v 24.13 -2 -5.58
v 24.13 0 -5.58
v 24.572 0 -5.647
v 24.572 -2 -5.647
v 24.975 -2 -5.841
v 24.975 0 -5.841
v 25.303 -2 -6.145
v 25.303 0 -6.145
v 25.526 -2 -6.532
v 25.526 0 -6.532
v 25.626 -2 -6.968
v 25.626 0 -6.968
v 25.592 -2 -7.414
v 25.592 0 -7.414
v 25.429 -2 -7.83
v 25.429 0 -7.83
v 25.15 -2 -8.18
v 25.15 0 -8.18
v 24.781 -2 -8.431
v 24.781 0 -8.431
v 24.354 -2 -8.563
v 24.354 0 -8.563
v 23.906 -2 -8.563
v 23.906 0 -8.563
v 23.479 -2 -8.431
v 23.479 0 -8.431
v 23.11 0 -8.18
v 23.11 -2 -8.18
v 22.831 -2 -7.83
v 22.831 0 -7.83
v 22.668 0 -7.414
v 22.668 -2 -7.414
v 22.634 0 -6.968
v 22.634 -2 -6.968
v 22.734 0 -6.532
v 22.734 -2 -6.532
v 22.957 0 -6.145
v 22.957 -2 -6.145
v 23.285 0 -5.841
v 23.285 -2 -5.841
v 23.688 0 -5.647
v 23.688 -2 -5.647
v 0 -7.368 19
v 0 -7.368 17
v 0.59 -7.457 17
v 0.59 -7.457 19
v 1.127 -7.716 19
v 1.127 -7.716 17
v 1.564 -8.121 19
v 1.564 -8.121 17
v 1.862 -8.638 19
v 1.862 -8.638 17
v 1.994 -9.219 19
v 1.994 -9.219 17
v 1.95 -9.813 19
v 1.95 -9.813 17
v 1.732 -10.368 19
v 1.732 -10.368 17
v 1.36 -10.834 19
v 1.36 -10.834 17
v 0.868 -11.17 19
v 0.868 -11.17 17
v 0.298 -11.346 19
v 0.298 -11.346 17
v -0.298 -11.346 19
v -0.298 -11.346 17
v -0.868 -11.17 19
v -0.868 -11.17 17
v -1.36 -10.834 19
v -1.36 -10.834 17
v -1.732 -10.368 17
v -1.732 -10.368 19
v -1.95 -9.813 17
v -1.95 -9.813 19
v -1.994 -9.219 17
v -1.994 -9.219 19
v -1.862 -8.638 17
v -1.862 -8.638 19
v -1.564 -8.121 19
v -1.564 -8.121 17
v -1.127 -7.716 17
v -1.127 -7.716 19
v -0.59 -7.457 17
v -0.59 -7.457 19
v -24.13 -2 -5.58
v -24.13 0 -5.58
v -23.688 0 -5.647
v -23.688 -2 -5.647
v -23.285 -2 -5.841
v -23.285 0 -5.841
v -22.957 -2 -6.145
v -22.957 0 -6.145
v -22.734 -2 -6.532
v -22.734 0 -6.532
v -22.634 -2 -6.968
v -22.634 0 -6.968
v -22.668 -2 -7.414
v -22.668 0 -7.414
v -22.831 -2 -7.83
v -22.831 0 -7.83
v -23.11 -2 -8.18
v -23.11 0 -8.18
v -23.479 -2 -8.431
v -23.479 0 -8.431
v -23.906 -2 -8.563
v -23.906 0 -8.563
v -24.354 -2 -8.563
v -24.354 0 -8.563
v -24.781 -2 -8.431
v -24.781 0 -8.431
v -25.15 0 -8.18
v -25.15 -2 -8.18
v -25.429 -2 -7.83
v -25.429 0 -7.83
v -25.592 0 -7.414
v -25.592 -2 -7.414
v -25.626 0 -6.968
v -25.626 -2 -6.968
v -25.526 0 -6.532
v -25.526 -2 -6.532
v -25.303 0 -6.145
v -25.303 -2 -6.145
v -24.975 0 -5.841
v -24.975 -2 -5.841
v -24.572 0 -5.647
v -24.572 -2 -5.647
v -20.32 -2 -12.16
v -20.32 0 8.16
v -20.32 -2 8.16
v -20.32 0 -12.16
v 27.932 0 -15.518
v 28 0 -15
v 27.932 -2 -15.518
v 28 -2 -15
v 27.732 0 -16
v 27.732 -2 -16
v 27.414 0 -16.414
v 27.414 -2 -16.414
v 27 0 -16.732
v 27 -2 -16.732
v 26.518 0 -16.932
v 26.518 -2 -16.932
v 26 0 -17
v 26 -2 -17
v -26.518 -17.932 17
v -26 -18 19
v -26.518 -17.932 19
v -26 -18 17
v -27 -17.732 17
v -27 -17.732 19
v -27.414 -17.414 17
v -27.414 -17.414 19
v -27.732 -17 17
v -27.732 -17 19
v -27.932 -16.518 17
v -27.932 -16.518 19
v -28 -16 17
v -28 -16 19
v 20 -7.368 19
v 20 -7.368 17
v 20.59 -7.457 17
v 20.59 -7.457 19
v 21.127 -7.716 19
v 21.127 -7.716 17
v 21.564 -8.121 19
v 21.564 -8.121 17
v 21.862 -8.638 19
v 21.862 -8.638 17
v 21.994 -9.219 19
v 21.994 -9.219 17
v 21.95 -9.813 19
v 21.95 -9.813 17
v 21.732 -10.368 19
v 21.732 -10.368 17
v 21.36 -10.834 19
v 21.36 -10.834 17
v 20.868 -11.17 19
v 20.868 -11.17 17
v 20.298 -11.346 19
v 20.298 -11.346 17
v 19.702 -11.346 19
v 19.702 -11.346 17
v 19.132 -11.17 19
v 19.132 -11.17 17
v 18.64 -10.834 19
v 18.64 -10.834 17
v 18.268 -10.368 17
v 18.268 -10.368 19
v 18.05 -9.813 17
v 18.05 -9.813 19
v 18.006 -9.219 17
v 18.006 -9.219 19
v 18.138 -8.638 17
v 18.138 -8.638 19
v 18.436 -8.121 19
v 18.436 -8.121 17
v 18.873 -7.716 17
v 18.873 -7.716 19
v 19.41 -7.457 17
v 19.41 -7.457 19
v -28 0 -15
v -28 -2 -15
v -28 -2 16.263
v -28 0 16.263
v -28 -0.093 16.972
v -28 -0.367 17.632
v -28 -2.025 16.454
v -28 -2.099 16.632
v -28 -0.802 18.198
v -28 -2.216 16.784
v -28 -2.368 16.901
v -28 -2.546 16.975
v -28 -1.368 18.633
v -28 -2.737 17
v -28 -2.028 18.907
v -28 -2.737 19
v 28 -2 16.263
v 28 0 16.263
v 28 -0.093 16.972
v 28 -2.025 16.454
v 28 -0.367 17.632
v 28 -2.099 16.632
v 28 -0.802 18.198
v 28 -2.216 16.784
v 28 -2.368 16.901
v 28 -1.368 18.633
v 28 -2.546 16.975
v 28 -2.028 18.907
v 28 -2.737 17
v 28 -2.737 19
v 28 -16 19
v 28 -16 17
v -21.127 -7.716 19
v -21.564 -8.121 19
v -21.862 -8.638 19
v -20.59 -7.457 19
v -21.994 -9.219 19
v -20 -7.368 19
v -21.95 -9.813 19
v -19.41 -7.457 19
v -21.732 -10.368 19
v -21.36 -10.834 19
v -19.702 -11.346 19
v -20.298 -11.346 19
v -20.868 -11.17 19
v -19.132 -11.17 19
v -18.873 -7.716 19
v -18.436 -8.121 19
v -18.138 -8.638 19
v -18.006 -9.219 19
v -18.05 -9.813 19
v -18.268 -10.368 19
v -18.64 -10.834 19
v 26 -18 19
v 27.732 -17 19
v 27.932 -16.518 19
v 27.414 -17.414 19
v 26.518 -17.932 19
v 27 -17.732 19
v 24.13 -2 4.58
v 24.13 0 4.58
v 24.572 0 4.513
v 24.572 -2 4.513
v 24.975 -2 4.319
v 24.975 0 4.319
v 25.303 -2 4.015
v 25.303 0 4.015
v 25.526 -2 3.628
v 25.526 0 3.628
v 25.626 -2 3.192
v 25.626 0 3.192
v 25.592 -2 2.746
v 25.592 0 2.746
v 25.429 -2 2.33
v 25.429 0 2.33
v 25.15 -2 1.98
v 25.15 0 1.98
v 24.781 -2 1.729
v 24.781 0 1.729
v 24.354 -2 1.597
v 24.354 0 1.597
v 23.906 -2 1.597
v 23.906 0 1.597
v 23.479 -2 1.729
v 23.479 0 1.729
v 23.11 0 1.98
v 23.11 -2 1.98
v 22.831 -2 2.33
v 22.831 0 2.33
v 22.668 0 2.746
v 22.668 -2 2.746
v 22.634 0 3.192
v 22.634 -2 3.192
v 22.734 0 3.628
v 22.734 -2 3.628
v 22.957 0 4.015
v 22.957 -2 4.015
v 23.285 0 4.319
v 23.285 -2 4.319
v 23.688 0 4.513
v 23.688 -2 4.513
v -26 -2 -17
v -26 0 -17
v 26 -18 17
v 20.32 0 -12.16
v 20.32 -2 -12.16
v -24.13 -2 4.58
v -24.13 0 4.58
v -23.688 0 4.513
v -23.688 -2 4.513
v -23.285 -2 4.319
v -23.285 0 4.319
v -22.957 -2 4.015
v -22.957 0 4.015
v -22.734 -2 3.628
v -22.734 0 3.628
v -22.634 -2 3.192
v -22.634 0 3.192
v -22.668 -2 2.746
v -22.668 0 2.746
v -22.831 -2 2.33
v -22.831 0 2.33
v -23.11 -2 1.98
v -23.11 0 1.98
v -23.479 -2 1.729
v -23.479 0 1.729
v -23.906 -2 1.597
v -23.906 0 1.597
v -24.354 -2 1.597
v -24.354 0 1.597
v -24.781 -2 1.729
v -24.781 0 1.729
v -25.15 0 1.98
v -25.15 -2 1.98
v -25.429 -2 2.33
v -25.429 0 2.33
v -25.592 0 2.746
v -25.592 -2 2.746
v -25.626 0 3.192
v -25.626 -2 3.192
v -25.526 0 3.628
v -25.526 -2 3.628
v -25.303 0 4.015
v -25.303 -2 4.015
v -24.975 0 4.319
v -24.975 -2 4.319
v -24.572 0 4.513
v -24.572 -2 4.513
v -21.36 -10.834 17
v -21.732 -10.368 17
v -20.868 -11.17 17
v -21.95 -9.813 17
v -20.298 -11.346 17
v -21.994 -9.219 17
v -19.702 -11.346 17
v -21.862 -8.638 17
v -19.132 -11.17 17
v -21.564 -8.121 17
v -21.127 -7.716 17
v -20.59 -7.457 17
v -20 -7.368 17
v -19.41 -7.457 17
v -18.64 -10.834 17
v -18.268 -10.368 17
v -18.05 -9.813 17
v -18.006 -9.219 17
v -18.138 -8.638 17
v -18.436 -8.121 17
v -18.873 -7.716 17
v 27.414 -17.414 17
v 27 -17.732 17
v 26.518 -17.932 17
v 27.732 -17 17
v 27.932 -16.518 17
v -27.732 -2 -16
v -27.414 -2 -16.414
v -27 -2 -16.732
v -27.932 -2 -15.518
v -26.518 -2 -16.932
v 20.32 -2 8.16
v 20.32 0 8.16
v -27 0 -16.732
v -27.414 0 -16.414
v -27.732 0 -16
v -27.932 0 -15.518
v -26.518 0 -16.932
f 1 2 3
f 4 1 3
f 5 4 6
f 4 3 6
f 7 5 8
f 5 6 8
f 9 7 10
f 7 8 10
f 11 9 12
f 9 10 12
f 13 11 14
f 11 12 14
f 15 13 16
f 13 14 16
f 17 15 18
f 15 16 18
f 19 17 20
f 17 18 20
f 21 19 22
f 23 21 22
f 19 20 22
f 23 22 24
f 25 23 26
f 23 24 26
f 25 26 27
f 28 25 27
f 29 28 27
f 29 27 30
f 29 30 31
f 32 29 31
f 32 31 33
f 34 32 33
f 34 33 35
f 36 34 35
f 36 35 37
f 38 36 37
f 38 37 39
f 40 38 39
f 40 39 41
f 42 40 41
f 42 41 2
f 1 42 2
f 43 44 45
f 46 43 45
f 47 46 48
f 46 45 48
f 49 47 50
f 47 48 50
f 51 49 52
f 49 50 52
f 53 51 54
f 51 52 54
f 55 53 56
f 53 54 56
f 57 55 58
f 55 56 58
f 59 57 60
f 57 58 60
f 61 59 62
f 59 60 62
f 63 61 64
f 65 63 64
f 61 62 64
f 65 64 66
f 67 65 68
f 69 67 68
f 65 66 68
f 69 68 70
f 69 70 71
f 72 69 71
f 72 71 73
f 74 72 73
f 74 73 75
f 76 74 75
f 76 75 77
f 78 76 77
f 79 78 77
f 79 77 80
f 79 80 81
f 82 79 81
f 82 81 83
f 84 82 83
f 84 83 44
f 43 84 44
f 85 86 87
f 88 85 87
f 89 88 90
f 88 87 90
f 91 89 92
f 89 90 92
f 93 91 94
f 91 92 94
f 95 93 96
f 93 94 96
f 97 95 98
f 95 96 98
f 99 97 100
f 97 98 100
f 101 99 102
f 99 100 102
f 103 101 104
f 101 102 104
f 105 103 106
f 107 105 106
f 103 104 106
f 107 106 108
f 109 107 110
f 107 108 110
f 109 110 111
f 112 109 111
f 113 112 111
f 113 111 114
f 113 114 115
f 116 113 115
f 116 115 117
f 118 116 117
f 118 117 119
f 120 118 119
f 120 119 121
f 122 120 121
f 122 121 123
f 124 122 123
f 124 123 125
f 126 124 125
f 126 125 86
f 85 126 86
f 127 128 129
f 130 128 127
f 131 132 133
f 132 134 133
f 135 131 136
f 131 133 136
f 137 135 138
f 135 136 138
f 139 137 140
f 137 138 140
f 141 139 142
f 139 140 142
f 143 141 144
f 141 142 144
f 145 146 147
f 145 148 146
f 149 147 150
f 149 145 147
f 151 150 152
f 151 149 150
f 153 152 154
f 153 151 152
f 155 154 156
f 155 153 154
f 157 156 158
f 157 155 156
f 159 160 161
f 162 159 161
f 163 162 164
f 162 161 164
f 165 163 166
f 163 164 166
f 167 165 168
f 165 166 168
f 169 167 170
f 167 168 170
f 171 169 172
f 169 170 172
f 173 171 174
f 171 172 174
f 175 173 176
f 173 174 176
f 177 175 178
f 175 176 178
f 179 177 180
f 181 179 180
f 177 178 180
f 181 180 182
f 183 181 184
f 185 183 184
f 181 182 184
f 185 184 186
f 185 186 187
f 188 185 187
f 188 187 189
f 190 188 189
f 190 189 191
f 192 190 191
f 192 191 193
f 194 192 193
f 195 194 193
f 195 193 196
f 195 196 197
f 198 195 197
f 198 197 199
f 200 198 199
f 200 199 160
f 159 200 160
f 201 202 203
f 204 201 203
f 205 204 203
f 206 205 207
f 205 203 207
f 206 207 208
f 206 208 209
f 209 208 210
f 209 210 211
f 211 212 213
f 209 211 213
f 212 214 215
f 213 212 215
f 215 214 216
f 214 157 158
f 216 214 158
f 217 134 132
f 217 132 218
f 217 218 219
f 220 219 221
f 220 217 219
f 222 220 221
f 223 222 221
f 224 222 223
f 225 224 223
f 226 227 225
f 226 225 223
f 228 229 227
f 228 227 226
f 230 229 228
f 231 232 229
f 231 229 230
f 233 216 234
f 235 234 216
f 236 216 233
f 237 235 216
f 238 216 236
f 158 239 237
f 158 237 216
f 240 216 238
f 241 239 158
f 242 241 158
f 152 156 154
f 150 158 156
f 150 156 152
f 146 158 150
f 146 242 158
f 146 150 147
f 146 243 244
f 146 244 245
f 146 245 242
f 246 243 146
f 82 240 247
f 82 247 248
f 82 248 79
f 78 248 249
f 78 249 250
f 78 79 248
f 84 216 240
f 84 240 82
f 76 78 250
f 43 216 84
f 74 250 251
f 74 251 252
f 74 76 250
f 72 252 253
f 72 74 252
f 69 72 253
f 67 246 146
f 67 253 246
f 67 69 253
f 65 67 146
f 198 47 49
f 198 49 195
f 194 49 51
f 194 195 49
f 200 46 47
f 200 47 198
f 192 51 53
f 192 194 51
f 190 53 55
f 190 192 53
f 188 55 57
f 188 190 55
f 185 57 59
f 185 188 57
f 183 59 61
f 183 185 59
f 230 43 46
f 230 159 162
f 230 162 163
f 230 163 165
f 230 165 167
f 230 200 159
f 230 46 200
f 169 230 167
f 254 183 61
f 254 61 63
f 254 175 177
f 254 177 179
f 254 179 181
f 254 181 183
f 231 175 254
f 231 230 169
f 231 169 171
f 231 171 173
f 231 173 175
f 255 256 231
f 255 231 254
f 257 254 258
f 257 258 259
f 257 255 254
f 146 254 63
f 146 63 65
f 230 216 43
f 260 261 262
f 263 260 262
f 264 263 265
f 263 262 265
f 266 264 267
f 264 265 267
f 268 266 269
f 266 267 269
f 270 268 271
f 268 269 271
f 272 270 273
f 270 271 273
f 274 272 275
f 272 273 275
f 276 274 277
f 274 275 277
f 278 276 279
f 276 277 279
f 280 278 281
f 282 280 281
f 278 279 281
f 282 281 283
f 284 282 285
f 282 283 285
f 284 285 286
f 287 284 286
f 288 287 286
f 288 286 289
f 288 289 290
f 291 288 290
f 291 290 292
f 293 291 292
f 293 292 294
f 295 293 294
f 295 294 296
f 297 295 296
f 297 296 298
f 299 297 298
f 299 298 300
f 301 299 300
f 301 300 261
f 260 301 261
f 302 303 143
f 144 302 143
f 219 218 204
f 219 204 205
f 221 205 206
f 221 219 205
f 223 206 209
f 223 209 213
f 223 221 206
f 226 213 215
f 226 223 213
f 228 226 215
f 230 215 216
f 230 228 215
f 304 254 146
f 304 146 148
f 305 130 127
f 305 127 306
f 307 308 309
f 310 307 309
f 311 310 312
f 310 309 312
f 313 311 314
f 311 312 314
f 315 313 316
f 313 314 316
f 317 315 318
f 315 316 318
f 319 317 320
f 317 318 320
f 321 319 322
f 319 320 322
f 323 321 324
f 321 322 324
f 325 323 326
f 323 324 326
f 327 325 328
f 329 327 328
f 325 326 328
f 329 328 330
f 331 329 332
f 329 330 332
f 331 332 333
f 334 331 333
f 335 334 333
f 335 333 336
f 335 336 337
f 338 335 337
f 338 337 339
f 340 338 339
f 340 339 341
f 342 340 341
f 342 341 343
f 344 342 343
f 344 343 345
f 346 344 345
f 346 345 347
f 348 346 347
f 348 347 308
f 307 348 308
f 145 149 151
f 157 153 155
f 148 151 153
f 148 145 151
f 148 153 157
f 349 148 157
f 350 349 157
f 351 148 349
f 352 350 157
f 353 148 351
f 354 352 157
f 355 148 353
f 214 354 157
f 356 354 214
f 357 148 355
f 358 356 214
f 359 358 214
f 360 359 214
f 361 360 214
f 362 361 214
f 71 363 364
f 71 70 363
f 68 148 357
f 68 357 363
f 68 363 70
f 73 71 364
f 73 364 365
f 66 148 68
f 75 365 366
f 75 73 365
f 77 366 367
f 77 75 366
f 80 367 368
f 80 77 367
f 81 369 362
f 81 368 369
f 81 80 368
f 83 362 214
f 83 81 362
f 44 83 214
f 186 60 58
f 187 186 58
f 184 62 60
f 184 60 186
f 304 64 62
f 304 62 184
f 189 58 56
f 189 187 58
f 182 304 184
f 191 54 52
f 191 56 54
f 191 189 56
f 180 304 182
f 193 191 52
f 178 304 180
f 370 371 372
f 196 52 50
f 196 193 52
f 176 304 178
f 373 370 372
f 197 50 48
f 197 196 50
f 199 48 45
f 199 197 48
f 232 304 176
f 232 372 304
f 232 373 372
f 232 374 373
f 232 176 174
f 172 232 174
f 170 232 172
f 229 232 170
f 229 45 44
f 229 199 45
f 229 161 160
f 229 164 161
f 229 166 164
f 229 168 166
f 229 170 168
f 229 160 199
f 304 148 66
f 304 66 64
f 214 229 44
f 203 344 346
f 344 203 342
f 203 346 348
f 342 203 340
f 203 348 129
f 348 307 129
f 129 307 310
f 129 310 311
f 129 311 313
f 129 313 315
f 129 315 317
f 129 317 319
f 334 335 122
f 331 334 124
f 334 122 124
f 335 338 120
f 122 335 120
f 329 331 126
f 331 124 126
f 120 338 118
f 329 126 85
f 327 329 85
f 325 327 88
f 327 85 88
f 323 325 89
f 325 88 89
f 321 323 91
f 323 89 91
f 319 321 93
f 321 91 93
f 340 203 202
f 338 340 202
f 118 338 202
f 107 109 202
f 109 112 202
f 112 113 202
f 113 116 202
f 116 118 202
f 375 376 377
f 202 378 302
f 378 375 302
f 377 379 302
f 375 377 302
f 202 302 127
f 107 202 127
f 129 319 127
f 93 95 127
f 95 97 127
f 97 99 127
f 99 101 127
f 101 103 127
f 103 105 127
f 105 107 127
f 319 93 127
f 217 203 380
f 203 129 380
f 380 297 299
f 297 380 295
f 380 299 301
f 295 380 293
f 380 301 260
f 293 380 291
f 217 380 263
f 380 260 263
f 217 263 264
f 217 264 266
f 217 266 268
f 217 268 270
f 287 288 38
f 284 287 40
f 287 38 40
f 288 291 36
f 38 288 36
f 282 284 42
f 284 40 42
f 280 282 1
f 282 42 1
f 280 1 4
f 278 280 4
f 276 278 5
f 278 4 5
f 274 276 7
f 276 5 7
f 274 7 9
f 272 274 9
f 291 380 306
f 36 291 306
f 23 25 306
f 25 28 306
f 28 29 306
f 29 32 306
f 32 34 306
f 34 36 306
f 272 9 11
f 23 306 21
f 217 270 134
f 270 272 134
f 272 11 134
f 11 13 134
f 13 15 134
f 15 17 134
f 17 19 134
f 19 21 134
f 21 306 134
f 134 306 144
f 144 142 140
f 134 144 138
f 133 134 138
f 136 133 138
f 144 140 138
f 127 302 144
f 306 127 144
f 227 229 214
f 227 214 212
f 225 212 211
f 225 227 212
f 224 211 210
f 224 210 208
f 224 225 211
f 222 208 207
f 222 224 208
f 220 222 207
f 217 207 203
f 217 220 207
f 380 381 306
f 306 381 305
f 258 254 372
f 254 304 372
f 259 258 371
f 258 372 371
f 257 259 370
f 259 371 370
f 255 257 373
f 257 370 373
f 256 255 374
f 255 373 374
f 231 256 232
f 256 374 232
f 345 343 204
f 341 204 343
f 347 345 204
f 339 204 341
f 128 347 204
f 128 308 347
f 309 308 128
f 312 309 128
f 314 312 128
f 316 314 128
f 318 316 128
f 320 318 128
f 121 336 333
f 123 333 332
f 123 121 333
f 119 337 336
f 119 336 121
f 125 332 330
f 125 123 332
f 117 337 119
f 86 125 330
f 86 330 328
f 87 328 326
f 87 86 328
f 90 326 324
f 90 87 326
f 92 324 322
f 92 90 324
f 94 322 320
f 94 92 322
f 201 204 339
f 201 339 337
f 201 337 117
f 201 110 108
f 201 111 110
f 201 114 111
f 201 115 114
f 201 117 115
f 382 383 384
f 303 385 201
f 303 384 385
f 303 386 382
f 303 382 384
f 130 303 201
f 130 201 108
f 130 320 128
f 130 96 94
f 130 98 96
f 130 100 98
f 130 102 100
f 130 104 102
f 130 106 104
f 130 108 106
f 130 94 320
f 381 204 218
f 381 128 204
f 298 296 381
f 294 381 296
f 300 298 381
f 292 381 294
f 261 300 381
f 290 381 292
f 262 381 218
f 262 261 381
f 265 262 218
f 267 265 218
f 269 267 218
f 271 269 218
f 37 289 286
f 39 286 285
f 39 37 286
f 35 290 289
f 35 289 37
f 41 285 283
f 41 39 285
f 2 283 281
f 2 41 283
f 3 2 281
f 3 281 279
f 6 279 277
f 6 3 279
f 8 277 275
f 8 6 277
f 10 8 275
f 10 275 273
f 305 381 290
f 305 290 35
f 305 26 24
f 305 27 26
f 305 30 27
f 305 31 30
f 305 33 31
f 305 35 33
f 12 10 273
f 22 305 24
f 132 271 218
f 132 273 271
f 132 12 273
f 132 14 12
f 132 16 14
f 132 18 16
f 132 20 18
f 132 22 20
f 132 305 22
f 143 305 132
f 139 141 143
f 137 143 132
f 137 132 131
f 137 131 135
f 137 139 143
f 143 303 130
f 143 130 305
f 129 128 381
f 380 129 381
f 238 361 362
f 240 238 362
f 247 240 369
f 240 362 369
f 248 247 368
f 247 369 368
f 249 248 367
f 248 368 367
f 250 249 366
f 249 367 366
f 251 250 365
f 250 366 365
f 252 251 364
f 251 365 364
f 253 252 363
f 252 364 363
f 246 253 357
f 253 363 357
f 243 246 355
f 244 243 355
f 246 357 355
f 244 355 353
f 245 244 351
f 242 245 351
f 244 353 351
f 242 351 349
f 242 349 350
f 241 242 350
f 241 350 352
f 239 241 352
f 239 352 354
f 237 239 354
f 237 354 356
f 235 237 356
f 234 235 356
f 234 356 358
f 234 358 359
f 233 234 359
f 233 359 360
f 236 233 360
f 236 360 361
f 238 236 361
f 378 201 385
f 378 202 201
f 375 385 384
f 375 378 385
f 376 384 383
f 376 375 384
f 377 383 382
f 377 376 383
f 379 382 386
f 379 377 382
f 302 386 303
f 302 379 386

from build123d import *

# Parameters (mm, degrees)
SKETCH1_W                    = 56
SKETCH1_H                    = 34
BASE_FLANGE1_DEPTH           = 2
EDGE_FLANGE1_STRIP_W         = 9.4732
EDGE_FLANGE1_STRIP_H         = 2
EDGE_FLANGE1_STRIP_CUT_DEPTH = 56
EDGE_FLANGE1_DEPTH           = 56
SKETCH9_W                    = 40.64
SKETCH9_H                    = 20.32
CUT_EXTRUDE1_DEPTH           = 39.327535793
SKETCH10_R                   = 1.5
CUT_EXTRUDE2_DEPTH           = 39.327535793
FILLET1_R                    = 2
SKETCH11_R                   = 2
CUT_EXTRUDE3_DEPTH           = 48.581509013


# Sheet-metal steps are written as plain solids
with BuildPart() as part:
    # Sketch1 → Base-Flange1 (new body)
    with BuildSketch(Plane(origin=(0, 0, 0), x_dir=(1, 0, 0), z_dir=(0, 1, 0))):
        Rectangle(SKETCH1_W, SKETCH1_H)
    extrude(amount=-BASE_FLANGE1_DEPTH)

    # Edge-Flange1 strip (across the edge) → Edge-Flange1 strip cut (cut)
    with BuildSketch(Plane(origin=(28, -2, 17), x_dir=(0, 0, -1), z_dir=(-1, 0, 0))):
        with Locations((-4, -1)):
            Rectangle(EDGE_FLANGE1_STRIP_W, EDGE_FLANGE1_STRIP_H)
    extrude(amount=EDGE_FLANGE1_STRIP_CUT_DEPTH, mode=Mode.SUBTRACT)

    # Edge-Flange1 section (across the edge) → Edge-Flange1 (add)
    with BuildSketch(Plane(origin=(28, -2, 17), x_dir=(0, 0, -1), z_dir=(-1, 0, 0))):
        with BuildLine():
            Line((-2, 0.7366), (-2, 16))
            Line((-2, 16), (0, 16))
            Line((0, 16), (0, 0.7366))
            ThreePointArc((0, 0.7366), (0.215745145, 0.215745145), (0.7366, 0))
            Line((0.7366, 0), (0.7366, -2))
            ThreePointArc((0.7366, -2), (-1.198468417, -1.198468417), (-2, 0.7366))
        make_face()
    extrude(amount=EDGE_FLANGE1_DEPTH)

    # Sketch9 → Cut-Extrude1 (cut, through all)
    with BuildSketch(Plane(origin=(0, 0, 0), x_dir=(1, 0, 0), z_dir=(0, 1, 0))):
        with Locations((0, 2)):
            Rectangle(SKETCH9_W, SKETCH9_H)
    extrude(amount=-CUT_EXTRUDE1_DEPTH, mode=Mode.SUBTRACT)

    # Sketch10 → Cut-Extrude2 (cut, through all)
    with BuildSketch(Plane(origin=(0, 0, 0), x_dir=(1, 0, 0), z_dir=(0, 1, 0))):
        with Locations(Location((-24.13, 7.08, 0), (0, 0, 270))):
            Circle(SKETCH10_R)
        with Locations(Location((-24.13, -3.08, 0), (0, 0, 270))):
            Circle(SKETCH10_R)
        with Locations(Location((24.13, 7.08, 0), (0, 0, 270))):
            Circle(SKETCH10_R)
        with Locations(Location((24.13, -3.08, 0), (0, 0, 270))):
            Circle(SKETCH10_R)
    extrude(amount=-CUT_EXTRUDE2_DEPTH, mode=Mode.SUBTRACT)

    # Fillet1
    fillet1_edges = [part.edges().sort_by_distance(p)[0] for p in [
        (28, -18, 18),
        (-28, -18, 18),
        (-28, -1, -17),
        (28, -1, -17),
    ]]
    fillet(fillet1_edges, radius=FILLET1_R)

    # Sketch11 → Cut-Extrude3 (cut, through all)
    with BuildSketch(Plane(origin=(0, 0, 17), x_dir=(-1, 0, 0), z_dir=(0, 0, -1))):
        with Locations(Location((0, -9.3683, 0), (0, 0, 90))):
            Circle(SKETCH11_R)
        with Locations(Location((-20, -9.3683, 0), (0, 0, 90))):
            Circle(SKETCH11_R)
        with Locations(Location((20, -9.3683, 0), (0, 0, 90))):
            Circle(SKETCH11_R)
    extrude(amount=-CUT_EXTRUDE3_DEPTH, mode=Mode.SUBTRACT)


solid = part.part
